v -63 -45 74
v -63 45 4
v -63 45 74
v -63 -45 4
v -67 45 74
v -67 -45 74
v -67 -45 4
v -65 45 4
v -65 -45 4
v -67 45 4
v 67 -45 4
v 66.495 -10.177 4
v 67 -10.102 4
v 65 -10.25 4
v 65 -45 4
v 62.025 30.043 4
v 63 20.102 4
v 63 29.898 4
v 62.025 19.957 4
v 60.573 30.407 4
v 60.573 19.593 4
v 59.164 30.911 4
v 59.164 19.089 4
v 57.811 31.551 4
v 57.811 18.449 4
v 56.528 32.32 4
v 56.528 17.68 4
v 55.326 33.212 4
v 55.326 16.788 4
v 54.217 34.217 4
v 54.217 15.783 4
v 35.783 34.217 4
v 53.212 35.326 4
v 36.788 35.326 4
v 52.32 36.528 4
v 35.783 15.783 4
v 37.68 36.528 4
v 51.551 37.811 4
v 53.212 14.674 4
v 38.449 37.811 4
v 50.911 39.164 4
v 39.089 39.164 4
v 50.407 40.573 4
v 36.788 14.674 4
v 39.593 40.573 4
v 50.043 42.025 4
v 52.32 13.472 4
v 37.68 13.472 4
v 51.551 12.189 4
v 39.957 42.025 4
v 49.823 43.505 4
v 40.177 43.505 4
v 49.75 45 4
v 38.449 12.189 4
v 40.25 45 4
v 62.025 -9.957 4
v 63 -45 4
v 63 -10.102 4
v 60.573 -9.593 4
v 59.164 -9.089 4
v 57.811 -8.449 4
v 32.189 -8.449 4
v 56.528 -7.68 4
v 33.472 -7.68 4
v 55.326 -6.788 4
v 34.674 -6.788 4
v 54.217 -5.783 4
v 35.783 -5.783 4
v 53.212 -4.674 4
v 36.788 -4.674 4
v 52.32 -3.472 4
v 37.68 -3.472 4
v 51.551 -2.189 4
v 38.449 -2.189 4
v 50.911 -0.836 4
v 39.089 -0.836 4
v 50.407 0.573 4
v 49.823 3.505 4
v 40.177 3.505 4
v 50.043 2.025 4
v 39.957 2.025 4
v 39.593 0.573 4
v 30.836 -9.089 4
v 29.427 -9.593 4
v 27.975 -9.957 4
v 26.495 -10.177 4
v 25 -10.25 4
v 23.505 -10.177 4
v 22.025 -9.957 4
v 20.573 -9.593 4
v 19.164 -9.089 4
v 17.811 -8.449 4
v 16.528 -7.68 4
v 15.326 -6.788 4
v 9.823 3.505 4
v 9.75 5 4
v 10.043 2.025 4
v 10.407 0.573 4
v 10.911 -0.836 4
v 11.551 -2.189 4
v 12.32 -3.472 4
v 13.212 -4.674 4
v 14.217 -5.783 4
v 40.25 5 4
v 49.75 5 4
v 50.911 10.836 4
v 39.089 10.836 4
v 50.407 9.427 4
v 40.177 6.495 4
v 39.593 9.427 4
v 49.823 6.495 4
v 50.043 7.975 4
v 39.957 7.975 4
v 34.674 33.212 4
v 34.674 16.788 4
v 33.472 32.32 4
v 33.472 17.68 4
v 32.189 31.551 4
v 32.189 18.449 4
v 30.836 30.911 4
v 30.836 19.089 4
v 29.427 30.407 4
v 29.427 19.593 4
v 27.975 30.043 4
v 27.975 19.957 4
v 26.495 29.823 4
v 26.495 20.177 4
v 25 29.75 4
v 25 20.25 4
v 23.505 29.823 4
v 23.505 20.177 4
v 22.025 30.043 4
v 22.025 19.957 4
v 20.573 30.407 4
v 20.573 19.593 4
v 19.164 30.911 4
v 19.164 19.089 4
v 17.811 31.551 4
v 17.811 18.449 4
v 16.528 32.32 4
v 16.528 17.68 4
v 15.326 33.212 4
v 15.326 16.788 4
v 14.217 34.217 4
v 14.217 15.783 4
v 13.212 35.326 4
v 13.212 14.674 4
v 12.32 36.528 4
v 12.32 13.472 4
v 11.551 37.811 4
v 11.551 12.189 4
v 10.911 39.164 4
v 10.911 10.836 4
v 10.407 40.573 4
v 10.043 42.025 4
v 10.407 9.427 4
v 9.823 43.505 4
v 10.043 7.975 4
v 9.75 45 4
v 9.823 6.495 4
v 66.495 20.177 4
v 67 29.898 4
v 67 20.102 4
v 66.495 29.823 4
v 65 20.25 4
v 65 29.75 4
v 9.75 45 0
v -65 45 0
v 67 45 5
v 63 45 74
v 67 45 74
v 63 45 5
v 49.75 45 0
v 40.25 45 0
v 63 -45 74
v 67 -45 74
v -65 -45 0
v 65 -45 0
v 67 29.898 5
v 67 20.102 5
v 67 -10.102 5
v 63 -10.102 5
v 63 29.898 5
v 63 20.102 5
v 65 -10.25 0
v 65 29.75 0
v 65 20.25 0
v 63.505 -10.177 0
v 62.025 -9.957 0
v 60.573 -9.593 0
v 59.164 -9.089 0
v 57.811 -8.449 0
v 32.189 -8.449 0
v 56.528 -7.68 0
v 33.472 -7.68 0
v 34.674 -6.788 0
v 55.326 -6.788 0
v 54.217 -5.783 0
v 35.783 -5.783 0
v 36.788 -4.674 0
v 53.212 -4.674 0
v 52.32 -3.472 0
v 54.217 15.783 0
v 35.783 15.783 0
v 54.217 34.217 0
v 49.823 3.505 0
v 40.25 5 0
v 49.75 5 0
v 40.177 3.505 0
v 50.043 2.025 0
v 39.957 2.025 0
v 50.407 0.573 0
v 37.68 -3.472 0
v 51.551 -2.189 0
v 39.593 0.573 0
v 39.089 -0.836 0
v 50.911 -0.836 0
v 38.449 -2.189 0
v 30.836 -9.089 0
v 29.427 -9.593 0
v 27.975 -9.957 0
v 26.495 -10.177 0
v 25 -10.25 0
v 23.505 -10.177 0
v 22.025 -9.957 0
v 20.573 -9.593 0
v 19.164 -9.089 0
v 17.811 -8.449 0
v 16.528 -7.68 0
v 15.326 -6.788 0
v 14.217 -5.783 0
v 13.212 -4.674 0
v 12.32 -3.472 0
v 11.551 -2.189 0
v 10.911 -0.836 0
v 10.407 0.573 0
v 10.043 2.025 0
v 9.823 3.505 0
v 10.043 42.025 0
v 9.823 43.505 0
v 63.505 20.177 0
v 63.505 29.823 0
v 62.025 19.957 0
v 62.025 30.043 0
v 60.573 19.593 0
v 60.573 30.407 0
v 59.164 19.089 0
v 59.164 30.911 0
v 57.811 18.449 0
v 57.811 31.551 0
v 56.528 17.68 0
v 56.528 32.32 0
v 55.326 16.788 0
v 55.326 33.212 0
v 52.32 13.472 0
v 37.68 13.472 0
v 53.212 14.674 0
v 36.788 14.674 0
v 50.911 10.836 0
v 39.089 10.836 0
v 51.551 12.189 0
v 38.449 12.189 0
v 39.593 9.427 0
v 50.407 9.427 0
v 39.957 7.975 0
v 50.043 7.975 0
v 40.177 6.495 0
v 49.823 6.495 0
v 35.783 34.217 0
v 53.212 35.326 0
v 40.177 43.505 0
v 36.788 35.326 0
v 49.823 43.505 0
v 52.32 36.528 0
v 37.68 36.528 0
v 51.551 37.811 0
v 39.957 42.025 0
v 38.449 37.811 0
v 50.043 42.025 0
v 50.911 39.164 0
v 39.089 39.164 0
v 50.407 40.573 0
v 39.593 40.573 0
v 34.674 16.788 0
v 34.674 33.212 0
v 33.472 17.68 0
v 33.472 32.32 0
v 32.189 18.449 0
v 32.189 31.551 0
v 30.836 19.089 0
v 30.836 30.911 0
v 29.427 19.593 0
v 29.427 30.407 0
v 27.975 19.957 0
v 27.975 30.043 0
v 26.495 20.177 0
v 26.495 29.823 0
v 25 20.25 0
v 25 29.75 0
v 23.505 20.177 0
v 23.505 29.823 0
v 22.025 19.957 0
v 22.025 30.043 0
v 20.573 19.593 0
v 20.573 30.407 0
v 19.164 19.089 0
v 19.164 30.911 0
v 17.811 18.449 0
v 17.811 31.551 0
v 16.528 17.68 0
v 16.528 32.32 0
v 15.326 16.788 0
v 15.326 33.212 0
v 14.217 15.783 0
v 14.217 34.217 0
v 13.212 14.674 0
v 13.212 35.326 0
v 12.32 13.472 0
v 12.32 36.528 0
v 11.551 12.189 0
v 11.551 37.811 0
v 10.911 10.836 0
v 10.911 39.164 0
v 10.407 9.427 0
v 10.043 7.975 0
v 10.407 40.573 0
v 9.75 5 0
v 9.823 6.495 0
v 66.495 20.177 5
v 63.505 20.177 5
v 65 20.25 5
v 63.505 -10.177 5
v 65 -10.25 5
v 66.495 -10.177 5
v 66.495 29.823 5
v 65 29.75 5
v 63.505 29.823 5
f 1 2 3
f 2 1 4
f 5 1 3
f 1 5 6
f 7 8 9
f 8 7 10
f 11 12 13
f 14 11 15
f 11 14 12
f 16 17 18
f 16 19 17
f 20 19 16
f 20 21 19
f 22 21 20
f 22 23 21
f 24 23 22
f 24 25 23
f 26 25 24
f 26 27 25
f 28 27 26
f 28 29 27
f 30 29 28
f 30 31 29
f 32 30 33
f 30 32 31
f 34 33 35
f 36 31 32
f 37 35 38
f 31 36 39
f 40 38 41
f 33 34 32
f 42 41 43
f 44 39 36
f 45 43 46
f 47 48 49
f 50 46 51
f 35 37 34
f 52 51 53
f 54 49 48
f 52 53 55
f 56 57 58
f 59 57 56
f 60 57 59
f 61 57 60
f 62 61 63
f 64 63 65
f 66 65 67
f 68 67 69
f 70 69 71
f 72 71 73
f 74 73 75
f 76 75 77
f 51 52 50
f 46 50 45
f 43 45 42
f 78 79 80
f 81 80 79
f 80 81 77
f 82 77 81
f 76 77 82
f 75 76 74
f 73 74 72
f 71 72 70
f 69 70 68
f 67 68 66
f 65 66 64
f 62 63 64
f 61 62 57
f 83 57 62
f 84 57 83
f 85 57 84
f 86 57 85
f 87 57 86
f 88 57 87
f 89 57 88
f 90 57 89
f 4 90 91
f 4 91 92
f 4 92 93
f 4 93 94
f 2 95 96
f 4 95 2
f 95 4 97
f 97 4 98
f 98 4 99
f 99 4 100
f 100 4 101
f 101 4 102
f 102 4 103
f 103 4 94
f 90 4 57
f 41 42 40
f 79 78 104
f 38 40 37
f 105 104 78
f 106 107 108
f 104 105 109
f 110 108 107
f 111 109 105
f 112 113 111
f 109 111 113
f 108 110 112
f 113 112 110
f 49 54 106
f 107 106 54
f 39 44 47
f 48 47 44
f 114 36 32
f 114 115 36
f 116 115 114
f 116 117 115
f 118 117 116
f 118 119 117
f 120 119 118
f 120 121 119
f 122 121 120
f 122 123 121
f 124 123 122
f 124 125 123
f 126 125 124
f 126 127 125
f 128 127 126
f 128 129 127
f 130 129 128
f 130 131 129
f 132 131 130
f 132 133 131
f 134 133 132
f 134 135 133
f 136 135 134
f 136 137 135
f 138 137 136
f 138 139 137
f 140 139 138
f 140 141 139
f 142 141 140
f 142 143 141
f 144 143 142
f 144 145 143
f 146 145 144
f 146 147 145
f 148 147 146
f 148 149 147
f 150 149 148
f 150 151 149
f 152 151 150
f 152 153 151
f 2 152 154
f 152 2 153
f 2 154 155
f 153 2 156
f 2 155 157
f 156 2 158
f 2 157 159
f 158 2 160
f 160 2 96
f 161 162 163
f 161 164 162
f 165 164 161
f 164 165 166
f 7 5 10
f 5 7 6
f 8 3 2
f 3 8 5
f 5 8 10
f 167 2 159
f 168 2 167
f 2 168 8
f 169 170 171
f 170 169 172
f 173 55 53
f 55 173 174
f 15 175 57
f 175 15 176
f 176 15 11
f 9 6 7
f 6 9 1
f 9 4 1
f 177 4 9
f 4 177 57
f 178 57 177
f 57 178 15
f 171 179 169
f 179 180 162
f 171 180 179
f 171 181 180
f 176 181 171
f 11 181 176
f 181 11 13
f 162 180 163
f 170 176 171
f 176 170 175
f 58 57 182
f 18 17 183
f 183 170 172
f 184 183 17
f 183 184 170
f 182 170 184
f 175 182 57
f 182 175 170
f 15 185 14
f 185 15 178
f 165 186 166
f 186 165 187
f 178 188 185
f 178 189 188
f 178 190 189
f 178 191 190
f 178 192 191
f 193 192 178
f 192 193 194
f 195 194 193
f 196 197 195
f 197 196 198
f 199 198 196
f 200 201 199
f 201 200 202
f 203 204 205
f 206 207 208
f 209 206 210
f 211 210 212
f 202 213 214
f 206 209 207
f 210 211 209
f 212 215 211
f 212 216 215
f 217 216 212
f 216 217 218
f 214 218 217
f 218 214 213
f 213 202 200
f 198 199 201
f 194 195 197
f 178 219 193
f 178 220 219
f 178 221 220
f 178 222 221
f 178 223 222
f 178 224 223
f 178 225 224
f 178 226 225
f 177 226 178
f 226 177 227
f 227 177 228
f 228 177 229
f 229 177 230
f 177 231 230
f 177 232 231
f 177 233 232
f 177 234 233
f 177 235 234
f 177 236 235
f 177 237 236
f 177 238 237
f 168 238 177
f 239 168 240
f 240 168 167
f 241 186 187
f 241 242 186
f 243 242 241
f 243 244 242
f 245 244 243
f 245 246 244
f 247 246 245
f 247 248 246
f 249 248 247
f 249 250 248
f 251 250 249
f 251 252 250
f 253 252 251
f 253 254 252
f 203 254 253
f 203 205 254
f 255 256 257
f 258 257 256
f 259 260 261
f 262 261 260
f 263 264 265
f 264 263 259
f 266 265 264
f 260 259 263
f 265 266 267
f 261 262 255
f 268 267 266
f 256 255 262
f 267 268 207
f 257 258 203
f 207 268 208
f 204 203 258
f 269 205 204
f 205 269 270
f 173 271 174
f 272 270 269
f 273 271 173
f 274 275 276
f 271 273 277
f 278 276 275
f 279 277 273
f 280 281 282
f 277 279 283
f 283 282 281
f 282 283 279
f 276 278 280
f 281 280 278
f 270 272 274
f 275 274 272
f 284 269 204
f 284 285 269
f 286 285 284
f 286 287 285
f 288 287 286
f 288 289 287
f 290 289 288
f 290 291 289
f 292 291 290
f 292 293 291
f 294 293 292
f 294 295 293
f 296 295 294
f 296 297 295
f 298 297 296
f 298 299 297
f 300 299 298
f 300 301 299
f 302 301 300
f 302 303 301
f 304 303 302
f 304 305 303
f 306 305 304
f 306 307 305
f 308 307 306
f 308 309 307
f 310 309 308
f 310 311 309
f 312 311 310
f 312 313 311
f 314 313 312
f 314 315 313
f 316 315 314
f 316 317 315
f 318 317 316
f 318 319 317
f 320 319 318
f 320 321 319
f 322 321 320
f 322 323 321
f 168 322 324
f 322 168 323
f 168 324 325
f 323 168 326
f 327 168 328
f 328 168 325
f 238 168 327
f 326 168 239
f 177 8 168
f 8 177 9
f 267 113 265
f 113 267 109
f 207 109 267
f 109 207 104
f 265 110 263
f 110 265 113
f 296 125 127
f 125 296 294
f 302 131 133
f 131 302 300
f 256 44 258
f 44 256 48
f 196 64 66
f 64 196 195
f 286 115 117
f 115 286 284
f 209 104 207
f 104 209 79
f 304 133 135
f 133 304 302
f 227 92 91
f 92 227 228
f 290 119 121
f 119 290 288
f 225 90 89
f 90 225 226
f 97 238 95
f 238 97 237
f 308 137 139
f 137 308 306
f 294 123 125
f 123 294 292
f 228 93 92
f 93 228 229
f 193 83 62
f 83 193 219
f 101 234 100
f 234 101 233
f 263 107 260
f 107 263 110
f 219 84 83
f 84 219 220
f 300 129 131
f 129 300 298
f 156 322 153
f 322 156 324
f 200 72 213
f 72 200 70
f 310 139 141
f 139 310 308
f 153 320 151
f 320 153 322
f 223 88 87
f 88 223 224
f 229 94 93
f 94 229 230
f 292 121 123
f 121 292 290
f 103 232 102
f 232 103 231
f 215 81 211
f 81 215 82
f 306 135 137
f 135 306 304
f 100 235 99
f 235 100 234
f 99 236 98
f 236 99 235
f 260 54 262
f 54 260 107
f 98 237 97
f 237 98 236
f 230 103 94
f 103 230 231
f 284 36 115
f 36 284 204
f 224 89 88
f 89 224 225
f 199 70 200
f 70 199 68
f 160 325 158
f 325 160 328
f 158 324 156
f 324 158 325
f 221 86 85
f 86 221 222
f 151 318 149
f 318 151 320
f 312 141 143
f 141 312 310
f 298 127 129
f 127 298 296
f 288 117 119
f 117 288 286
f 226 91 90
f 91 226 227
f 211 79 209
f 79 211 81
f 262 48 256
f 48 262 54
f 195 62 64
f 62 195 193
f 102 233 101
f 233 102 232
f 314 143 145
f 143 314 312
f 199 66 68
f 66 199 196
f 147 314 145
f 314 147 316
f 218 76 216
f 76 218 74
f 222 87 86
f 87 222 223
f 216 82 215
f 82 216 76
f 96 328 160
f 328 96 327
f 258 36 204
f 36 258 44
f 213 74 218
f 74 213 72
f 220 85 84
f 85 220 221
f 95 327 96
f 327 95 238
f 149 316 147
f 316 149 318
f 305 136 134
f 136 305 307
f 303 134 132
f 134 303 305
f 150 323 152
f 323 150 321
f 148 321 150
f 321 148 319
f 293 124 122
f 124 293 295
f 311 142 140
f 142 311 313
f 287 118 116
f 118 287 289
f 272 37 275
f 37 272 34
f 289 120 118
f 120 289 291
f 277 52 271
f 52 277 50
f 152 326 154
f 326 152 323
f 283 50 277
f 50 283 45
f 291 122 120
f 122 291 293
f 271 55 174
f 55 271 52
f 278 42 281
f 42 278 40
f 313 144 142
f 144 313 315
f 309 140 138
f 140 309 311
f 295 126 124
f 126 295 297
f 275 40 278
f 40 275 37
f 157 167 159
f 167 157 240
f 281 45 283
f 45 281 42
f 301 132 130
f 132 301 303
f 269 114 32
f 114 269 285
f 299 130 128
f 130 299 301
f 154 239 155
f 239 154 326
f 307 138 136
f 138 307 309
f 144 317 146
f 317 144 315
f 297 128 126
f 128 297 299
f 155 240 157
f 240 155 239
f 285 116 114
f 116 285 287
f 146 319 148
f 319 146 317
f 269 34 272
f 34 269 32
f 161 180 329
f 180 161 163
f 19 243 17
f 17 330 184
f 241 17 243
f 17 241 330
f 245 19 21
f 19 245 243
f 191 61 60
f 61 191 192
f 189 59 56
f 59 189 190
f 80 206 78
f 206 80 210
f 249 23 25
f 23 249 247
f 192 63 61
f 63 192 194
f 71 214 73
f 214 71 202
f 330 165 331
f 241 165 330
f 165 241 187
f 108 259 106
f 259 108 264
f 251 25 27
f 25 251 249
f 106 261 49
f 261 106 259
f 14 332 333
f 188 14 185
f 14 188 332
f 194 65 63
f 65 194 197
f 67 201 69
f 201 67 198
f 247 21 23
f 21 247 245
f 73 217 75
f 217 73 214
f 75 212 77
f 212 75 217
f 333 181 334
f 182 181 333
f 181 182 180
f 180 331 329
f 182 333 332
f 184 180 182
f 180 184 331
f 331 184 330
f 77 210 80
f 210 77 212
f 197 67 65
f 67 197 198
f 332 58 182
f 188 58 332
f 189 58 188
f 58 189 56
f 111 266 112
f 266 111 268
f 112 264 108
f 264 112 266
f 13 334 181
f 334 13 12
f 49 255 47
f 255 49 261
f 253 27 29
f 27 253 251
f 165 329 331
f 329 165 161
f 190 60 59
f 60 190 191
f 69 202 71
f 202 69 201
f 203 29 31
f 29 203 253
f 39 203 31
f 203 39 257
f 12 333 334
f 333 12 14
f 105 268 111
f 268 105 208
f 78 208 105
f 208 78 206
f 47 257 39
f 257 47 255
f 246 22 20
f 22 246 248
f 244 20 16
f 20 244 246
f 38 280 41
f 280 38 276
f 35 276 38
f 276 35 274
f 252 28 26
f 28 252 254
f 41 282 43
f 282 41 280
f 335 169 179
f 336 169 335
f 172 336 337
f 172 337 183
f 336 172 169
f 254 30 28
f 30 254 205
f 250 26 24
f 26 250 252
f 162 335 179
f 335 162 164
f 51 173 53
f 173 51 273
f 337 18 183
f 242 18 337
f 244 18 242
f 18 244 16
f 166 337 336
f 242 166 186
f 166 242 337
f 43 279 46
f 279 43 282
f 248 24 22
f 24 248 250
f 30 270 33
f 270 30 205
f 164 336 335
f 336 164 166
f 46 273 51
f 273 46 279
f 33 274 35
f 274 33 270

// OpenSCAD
// Rack for six 50 mL conical (Falcon-type) tubes
// Printed upside down and flipped over after printing

$fn = 64;

// Plate dimensions
plate_x = 130; // mm
plate_y = 90;  // mm
plate_z = 4;   // mm

// Hole dimensions
hole_dia = 30.5; // mm
hole_spacing_x = 40; // mm
hole_spacing_y = 40; // mm
hole_offset_x = (plate_x - 2 * hole_spacing_x) / 2; // mm, centred
hole_offset_y = (plate_y - 2 * hole_spacing_y) / 2; // mm, centred

// Wall dimensions
wall_thickness = 4; // mm
wall_height = 70;   // mm

// Plate
plate = [
    [-plate_x/2, -plate_y/2, 0],
    [plate_x/2, plate_y/2, plate_z]
];

// Wall positions: left and right (along X axis)
wall_left_x = -plate_x/2;
wall_right_x = plate_x/2;

// Generate holes
module holes() {
    for (i = [0:2]) {
        for (j = [0:1]) {
            x = hole_offset_x + i * hole_spacing_x;
            y = hole_offset_y + j * hole_spacing_y;
            translate([x, y, -1]) 
                cylinder(h = plate_z + 2, d = hole_dia);
        }
    }
}

// Generate walls
module walls() {
    // Left wall
    translate([wall_left_x - wall_thickness/2, -plate_y/2, plate_z])
        cube([wall_thickness, plate_y, wall_height]);
    
    // Right wall
    translate([wall_right_x - wall_thickness/2, -plate_y/2, plate_z])
        cube([wall_thickness, plate_y, wall_height]);
}

// Main body: plate with holes and walls
module rack() {
    difference() {
        union() {
            // Base plate
            translate([0, 0, plate_z/2])
                cube([plate_x, plate_y, plate_z], center=true);
            
            // Walls
            walls();
        }
        
        // Holes
        holes();
    }
}

rack();
